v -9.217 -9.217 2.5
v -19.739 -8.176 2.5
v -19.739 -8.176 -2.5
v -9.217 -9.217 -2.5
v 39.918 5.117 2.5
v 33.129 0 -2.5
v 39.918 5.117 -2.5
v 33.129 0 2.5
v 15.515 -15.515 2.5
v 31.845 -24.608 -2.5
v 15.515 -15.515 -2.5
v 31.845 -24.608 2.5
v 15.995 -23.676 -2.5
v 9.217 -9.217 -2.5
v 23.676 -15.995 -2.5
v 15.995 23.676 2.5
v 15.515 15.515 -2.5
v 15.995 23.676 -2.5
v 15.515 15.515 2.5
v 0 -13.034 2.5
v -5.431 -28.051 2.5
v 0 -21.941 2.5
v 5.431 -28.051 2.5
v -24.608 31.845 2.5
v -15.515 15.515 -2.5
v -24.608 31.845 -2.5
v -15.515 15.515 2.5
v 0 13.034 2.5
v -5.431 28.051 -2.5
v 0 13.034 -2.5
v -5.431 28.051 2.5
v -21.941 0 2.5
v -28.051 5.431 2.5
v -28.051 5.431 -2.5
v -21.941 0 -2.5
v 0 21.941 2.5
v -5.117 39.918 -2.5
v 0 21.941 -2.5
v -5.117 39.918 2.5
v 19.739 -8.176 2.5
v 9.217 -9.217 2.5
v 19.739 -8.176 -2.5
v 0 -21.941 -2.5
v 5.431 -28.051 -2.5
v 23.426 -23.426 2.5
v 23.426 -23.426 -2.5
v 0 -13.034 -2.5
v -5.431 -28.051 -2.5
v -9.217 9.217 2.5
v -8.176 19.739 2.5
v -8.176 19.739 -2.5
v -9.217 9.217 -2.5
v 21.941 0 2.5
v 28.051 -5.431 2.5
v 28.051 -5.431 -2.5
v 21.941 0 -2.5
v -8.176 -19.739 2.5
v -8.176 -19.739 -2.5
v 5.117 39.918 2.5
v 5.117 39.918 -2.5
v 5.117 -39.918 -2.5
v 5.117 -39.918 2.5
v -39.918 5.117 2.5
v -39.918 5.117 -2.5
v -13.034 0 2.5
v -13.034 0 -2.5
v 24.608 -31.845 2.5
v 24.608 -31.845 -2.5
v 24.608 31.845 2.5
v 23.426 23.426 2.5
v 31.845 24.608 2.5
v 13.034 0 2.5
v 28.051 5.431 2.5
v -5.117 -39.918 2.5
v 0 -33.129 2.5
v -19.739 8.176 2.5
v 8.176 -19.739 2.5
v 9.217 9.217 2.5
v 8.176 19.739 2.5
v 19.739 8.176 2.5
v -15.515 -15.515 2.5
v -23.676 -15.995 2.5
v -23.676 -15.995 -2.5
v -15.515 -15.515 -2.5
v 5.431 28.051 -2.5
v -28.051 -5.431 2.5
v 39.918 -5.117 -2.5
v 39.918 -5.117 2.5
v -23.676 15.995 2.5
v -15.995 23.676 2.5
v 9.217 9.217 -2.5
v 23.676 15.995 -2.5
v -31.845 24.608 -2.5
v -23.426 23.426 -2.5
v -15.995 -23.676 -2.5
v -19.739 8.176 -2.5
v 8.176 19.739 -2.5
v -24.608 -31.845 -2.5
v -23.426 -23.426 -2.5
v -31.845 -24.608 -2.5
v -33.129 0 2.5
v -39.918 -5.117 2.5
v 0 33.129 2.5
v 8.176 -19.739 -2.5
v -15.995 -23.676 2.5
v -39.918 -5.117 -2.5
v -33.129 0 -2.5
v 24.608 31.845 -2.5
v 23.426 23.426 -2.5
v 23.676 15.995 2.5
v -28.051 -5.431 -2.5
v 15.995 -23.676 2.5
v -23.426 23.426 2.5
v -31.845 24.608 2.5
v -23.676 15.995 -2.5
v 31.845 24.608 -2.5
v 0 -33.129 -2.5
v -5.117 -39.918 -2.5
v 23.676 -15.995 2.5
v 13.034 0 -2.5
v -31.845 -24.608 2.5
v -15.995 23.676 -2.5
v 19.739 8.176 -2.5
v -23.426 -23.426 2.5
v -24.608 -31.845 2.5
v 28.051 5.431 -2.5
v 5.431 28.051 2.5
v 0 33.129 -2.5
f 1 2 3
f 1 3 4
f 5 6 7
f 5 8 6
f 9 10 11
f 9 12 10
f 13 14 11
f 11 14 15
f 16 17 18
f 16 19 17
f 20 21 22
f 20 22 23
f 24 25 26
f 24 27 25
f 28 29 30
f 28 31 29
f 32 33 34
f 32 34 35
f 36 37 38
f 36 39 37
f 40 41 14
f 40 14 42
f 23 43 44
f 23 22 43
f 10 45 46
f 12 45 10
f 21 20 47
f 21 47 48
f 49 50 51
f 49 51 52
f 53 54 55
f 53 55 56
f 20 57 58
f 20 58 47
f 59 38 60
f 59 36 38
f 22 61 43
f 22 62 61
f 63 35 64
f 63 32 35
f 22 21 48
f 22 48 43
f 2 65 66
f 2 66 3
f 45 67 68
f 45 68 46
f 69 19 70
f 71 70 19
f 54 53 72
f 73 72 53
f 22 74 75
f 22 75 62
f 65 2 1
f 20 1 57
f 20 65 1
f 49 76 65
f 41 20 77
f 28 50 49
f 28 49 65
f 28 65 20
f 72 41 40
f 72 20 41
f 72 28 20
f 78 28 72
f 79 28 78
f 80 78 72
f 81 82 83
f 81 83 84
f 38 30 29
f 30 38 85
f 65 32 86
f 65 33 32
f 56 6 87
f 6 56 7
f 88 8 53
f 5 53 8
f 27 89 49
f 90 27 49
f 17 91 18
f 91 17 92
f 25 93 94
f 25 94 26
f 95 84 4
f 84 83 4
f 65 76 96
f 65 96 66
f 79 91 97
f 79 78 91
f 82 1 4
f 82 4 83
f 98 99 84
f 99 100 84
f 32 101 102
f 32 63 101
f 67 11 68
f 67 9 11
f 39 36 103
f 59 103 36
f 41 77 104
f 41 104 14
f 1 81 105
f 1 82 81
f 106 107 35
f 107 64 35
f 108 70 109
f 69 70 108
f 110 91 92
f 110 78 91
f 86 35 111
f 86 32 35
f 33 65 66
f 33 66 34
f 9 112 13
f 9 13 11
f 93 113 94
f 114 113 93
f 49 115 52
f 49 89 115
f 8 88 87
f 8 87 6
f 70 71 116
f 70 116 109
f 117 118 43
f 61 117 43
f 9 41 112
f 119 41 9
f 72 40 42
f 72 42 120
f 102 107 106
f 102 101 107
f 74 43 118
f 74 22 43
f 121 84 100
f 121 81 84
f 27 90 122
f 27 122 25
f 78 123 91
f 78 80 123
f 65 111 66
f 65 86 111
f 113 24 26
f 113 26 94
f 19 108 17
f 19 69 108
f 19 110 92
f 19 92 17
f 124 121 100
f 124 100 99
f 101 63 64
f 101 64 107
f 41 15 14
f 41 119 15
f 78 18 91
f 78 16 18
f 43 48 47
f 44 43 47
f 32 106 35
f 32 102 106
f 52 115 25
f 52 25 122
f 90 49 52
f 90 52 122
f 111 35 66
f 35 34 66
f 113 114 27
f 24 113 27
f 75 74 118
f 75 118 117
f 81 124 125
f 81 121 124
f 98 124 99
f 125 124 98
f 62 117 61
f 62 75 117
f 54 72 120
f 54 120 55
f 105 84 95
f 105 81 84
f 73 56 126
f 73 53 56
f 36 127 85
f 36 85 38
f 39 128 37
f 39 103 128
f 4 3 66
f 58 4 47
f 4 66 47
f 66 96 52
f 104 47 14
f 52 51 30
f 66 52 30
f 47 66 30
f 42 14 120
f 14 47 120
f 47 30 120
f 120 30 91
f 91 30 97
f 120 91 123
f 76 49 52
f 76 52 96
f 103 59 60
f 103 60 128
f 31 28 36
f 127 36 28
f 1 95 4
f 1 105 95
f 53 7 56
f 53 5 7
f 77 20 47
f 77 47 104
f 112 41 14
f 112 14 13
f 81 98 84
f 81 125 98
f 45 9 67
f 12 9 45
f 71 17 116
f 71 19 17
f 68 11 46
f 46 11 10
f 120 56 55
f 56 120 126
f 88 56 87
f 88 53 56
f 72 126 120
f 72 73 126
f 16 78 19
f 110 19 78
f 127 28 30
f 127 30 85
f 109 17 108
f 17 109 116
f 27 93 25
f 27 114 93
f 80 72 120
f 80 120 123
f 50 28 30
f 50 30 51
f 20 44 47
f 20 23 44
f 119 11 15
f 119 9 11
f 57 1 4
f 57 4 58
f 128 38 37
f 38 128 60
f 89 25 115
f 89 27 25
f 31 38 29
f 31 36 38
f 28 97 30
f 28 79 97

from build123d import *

# Parameters (mm, degrees)
F1_DEPTH = 2.5


with BuildPart() as f1:
    # F0 (on Top) → F1 (new body, symmetric)
    with BuildSketch(Plane.XY):
        Polygon((24.607926, 31.844801), (15.514898, 15.514898), (31.844801, 24.607926), (23.425961, 23.425961), align=None)
        Polygon((15.994938, 23.675581), (9.216772, 9.216772), (23.675581, 15.994938), (15.514898, 15.514898), align=None)
        Polygon((39.918106, 5.117244), (21.94138, 0), (39.918106, -5.117244), (33.129312, 0), align=None)
        Polygon((28.051293, 5.431035), (13.034483, 0), (28.051293, -5.431035), (21.94138, 0), align=None)
        Polygon((31.844801, -24.607926), (15.514898, -15.514898), (24.607926, -31.844801), (23.425961, -23.425961), align=None)
        Polygon((23.675581, -15.994938), (9.216772, -9.216772), (15.994938, -23.675581), (15.514898, -15.514898), align=None)
        Polygon((5.117244, -39.918106), (0, -21.94138), (-5.117244, -39.918106), (0, -33.129312), align=None)
        Polygon((5.431035, -28.051293), (0, -13.034483), (-5.431035, -28.051293), (0, -21.94138), align=None)
        Polygon((-24.607926, -31.844801), (-15.514898, -15.514898), (-31.844801, -24.607926), (-23.425961, -23.425961), align=None)
        Polygon((-15.994938, -23.675581), (-9.216772, -9.216772), (-23.675581, -15.994938), (-15.514898, -15.514898), align=None)
        Polygon((-39.918106, -5.117244), (-21.94138, 0), (-39.918106, 5.117244), (-33.129312, 0), align=None)
        Polygon((-28.051293, -5.431035), (-13.034483, 0), (-28.051293, 5.431035), (-21.94138, 0), align=None)
        Polygon((-31.844801, 24.607926), (-15.514898, 15.514898), (-24.607926, 31.844801), (-23.425961, 23.425961), align=None)
        Polygon((-23.675581, 15.994938), (-9.216772, 9.216772), (-15.994938, 23.675581), (-15.514898, 15.514898), align=None)
        Polygon((-5.431035, 28.051293), (0, 13.034483), (5.431035, 28.051293), (0, 21.94138), align=None)
        Polygon((-5.117244, 39.918106), (0, 21.94138), (5.117244, 39.918106), (0, 33.129312), align=None)
        Polygon((8.176121, 19.738902), (0, 13.034483), (-8.176121, 19.738902), (-9.216772, 9.216772), (-19.738902, 8.176121), (-13.034483, 0), (-19.738902, -8.176121), (-9.216772, -9.216772), (-8.176121, -19.738902), (0, -13.034483), (8.176121, -19.738902), (9.216772, -9.216772), (19.738902, -8.176121), (13.034483, 0), (19.738902, 8.176121), (9.216772, 9.216772), align=None)
    extrude(amount=F1_DEPTH, both=True)


solid = f1.part
